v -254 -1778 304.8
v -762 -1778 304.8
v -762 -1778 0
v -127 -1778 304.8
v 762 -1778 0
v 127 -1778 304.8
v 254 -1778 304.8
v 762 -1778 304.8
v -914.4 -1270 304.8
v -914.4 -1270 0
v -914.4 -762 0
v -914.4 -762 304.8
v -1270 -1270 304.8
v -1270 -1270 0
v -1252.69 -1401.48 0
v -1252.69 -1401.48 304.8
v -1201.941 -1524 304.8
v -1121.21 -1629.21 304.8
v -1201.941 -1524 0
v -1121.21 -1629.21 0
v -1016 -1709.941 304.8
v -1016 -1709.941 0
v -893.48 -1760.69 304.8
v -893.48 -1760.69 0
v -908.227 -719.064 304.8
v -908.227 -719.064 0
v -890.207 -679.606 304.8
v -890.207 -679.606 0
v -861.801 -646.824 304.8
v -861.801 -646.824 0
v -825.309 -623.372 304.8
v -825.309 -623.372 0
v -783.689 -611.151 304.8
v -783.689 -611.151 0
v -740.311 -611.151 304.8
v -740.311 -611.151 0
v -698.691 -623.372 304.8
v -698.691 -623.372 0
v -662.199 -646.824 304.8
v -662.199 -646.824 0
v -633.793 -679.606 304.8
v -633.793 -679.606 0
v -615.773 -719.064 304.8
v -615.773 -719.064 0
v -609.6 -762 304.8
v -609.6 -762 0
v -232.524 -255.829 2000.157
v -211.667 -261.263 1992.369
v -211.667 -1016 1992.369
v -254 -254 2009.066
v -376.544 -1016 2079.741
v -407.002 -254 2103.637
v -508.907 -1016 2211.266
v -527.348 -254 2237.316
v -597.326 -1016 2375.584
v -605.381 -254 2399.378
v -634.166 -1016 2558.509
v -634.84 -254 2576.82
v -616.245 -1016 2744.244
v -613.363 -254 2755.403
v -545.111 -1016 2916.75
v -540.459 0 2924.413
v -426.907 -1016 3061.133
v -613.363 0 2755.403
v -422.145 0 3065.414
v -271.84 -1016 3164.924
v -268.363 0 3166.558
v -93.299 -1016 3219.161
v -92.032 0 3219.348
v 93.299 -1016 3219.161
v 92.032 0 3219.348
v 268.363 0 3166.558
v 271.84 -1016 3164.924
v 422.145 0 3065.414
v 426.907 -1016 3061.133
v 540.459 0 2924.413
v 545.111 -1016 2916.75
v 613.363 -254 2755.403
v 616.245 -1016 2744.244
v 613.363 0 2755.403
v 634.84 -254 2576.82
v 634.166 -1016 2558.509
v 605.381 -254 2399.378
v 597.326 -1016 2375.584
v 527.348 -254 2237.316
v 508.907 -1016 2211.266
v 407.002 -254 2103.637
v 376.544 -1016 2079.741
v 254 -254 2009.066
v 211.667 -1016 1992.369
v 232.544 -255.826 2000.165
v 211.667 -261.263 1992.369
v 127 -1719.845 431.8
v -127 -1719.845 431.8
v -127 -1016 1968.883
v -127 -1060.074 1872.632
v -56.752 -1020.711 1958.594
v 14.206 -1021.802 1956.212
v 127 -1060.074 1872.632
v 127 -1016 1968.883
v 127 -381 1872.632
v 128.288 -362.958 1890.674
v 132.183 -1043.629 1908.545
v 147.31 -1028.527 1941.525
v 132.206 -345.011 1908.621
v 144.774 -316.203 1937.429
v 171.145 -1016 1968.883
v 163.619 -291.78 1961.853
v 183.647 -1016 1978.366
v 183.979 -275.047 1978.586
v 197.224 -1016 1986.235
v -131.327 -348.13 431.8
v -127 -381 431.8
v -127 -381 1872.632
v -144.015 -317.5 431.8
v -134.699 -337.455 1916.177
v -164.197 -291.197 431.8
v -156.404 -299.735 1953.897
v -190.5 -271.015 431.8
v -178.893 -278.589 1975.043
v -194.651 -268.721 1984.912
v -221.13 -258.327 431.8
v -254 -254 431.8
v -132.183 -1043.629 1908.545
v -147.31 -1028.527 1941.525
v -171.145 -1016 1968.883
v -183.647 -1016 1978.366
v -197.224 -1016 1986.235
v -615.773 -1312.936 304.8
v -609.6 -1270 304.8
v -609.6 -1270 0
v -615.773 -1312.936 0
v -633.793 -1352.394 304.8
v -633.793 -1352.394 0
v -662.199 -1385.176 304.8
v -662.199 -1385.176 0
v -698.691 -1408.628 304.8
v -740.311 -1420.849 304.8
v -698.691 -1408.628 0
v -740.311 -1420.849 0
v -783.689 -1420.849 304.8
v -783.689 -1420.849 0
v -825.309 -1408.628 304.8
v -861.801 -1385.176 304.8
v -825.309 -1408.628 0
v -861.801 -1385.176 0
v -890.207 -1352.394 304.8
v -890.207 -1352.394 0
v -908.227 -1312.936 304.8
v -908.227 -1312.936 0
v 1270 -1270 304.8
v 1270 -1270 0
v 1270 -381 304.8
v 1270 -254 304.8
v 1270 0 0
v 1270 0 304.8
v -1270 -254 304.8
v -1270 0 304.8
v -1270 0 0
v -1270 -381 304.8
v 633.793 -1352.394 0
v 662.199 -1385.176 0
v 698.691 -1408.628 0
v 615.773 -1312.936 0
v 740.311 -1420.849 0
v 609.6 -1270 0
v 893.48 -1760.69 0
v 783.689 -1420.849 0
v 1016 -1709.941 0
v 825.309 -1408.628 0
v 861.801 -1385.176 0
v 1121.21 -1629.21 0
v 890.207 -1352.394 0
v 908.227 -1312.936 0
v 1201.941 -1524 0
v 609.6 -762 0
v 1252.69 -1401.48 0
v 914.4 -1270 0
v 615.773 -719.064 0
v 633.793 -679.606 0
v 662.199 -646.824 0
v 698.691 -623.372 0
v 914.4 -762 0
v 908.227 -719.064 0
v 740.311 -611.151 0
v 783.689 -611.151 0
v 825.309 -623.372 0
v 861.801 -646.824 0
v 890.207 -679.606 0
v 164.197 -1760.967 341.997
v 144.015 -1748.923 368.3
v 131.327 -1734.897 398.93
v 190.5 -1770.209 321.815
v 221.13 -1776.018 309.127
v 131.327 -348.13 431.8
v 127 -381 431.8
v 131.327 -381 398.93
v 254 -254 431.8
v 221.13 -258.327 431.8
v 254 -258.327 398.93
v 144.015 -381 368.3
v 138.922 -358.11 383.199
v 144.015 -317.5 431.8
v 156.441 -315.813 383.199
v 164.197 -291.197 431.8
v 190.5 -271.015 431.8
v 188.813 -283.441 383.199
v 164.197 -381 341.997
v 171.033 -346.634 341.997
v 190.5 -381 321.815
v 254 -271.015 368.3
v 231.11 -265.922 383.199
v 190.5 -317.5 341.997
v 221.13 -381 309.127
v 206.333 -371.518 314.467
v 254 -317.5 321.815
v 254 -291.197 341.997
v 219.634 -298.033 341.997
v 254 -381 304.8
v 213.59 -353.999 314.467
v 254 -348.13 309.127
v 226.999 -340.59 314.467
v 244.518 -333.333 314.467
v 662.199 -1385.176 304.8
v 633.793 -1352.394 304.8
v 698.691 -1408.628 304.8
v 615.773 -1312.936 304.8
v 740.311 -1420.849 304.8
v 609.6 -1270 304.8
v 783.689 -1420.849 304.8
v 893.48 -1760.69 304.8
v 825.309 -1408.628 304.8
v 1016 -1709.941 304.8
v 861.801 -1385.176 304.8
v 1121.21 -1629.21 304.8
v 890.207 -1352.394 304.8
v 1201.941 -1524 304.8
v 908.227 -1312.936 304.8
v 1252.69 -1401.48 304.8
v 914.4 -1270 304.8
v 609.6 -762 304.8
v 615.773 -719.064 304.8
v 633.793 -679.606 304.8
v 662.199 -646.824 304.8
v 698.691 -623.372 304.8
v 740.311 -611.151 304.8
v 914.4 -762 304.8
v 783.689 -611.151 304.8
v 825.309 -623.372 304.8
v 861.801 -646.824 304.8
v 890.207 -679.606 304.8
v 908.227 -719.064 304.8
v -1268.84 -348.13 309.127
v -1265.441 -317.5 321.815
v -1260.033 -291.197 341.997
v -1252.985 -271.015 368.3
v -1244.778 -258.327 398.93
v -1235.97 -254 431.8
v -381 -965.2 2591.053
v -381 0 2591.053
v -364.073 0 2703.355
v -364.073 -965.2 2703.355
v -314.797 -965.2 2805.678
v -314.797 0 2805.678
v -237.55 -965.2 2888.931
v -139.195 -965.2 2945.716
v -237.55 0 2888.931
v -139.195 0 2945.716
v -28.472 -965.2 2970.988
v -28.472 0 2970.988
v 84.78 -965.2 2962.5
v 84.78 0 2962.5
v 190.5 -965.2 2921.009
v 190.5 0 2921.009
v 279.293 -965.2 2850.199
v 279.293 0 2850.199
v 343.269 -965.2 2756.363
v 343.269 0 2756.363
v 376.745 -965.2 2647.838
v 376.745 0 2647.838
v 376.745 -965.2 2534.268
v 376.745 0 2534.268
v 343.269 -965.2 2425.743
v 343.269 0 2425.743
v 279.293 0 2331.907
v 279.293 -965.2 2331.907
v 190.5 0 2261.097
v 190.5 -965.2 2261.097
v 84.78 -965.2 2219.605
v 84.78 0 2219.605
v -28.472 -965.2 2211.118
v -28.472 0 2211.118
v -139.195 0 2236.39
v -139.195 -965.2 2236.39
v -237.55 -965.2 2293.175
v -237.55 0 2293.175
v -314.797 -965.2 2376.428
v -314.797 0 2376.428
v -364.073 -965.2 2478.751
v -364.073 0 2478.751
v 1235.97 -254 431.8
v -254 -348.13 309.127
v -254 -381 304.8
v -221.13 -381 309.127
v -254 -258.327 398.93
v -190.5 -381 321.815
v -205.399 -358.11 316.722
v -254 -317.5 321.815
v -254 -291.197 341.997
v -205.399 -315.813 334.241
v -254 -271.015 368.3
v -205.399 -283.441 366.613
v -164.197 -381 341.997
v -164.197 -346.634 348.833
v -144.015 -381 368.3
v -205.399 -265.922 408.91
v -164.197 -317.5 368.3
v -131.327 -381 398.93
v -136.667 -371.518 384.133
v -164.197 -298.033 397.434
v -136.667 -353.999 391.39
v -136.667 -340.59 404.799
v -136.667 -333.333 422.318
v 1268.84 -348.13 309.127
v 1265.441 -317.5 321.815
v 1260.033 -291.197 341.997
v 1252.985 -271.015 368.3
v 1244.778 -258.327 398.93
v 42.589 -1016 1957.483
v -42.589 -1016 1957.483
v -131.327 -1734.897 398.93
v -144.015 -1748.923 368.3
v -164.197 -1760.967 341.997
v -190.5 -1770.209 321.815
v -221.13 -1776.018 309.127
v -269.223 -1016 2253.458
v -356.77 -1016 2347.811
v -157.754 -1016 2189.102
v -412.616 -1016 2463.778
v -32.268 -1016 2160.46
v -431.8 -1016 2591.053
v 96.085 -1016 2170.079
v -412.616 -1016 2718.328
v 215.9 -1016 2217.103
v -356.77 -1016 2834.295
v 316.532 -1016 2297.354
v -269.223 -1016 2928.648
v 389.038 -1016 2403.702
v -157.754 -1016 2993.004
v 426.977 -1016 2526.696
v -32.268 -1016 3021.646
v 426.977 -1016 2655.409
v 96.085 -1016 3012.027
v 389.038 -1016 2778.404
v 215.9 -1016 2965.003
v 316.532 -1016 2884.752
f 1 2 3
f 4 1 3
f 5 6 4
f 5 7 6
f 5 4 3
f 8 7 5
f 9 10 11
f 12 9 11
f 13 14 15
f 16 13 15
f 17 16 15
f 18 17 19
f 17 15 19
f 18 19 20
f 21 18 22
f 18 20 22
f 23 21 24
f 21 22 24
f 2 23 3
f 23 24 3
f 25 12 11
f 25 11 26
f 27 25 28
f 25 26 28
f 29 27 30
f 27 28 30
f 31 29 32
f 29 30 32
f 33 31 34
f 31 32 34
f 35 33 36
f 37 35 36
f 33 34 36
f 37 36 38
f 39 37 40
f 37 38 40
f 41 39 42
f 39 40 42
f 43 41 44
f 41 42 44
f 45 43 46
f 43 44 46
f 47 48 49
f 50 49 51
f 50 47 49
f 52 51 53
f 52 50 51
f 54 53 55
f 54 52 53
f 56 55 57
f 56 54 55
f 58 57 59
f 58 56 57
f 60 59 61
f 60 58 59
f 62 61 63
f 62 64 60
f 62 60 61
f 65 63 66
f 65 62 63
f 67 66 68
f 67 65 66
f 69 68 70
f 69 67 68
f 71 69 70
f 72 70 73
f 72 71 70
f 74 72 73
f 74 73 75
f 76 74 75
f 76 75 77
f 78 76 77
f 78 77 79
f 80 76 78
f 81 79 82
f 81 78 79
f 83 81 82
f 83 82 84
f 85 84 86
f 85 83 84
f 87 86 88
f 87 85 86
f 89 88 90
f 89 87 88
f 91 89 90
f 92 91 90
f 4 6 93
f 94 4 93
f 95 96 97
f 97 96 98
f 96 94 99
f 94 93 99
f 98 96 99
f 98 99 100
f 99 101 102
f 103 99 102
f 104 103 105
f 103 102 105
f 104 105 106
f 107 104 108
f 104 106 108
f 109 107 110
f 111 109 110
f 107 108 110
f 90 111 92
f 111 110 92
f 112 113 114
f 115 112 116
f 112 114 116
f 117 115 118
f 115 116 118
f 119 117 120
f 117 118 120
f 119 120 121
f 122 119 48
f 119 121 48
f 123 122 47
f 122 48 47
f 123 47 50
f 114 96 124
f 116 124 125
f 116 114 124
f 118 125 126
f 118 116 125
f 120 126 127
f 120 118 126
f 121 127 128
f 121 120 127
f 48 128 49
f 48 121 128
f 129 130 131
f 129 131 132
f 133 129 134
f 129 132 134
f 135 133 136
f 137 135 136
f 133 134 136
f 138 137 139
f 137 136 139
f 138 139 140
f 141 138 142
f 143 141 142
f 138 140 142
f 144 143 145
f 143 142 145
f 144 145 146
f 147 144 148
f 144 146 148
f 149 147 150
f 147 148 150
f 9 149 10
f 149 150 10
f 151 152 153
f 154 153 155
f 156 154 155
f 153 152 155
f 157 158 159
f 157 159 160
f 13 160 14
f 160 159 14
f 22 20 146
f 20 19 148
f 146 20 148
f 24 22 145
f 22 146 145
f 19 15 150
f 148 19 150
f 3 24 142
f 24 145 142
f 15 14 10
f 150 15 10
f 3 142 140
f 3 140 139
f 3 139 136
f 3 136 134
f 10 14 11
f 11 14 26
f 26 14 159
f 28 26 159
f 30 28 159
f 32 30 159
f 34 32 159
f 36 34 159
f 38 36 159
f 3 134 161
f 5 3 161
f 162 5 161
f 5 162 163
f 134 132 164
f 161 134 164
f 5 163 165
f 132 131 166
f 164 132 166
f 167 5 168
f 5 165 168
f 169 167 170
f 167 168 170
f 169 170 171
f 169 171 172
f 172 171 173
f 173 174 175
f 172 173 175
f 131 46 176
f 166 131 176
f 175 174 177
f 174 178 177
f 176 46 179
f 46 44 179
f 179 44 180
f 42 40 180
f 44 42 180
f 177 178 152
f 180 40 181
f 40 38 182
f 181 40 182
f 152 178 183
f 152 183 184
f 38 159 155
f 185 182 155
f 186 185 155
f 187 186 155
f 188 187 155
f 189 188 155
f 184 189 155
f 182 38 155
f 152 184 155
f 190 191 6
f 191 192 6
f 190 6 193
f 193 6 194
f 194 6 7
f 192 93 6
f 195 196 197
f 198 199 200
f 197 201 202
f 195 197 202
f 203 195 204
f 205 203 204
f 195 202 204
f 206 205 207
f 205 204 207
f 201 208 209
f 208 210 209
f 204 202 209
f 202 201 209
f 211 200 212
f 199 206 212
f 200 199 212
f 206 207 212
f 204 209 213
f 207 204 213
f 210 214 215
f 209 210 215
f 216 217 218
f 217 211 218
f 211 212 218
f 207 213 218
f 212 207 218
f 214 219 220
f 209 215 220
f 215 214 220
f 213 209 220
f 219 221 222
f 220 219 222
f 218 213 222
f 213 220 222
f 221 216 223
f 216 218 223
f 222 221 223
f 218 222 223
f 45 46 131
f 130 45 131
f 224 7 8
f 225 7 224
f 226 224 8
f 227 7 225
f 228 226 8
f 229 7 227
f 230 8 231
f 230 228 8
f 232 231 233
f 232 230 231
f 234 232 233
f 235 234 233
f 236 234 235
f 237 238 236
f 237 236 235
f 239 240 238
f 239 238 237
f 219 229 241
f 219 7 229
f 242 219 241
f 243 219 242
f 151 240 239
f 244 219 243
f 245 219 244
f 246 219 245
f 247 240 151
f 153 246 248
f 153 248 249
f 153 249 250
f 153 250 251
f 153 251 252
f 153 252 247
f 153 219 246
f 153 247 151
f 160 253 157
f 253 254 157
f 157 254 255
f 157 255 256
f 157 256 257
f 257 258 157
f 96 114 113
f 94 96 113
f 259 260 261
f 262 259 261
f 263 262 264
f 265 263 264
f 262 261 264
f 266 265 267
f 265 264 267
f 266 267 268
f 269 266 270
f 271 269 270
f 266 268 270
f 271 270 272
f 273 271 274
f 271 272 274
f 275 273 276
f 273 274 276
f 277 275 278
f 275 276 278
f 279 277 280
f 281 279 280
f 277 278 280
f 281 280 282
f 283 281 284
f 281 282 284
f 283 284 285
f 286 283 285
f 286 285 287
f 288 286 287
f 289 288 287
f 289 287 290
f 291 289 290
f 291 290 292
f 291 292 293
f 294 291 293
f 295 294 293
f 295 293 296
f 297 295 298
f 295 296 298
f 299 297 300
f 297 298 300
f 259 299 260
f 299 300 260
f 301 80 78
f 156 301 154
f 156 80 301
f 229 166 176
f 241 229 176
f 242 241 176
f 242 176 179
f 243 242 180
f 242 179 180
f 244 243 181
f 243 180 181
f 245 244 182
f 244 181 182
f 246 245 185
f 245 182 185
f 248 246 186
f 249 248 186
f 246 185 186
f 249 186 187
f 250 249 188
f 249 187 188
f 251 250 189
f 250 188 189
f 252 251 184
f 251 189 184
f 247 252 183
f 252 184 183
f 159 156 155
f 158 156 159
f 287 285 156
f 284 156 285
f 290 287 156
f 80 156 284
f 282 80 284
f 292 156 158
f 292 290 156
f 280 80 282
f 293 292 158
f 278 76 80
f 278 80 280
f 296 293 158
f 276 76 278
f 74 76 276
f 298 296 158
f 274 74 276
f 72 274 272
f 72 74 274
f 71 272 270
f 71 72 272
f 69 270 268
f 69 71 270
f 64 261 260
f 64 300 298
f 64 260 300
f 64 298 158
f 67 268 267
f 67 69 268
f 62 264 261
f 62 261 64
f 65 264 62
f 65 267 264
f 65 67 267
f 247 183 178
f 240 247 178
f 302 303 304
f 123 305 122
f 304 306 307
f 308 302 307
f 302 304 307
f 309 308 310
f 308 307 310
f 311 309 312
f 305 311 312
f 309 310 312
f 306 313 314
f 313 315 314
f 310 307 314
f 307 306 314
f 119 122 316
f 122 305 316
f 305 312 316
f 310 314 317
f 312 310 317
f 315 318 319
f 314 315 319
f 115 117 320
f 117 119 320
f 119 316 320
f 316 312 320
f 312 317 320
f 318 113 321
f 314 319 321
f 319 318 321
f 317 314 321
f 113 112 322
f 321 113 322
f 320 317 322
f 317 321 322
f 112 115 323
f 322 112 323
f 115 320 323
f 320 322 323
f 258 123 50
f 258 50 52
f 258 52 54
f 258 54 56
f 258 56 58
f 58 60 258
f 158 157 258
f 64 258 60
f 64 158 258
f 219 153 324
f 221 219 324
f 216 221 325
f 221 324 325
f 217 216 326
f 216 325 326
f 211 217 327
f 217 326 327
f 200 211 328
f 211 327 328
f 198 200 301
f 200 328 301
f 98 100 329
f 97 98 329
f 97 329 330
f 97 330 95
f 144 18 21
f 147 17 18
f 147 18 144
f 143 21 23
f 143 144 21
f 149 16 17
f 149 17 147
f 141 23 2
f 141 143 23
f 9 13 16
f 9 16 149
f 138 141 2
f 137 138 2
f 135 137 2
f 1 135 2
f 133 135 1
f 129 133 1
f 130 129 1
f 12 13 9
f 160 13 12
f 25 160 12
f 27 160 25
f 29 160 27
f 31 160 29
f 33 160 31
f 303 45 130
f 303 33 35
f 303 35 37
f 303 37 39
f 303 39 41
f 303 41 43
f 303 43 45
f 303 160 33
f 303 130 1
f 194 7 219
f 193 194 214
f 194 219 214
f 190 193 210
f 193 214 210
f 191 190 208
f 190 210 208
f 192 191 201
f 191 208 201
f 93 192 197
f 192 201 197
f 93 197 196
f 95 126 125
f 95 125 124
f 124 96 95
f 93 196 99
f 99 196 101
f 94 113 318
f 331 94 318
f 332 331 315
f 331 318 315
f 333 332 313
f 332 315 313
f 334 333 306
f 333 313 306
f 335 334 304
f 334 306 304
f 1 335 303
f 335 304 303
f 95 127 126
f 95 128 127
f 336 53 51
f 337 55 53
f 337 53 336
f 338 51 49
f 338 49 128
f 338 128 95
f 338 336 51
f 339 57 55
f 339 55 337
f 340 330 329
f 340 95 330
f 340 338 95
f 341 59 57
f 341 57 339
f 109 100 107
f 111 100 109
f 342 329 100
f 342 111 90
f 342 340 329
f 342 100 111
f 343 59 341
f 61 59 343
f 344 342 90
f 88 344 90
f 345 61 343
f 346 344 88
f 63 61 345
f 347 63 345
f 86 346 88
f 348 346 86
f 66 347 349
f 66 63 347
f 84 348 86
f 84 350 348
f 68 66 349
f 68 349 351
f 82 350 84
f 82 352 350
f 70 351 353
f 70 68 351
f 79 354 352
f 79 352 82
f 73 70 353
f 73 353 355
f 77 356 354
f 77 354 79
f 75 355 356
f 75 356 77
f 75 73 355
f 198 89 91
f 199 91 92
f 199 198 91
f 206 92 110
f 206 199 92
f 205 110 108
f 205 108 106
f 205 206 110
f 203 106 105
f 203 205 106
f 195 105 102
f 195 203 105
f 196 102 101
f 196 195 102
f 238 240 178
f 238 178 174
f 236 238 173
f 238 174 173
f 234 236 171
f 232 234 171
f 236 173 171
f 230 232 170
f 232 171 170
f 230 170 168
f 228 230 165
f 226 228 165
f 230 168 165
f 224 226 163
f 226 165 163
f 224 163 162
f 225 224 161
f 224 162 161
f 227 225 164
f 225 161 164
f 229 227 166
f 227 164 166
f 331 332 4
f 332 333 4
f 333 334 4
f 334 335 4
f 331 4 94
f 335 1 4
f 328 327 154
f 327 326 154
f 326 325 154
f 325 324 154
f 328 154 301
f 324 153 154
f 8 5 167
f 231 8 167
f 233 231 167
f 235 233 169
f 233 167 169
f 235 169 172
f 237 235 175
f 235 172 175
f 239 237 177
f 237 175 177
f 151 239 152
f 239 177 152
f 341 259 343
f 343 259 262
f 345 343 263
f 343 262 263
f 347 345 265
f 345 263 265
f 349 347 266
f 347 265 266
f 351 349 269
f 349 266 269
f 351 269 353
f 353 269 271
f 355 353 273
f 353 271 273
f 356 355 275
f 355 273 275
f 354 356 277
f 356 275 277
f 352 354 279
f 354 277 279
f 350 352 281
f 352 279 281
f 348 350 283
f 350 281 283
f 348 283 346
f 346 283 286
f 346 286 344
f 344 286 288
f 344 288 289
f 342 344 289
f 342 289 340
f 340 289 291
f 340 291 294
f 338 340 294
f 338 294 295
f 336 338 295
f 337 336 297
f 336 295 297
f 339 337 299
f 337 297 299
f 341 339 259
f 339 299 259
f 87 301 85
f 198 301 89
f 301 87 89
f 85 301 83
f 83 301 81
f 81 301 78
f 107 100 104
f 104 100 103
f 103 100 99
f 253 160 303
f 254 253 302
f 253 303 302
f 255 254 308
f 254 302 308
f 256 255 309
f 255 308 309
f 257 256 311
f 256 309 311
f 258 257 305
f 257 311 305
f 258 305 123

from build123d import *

# Parameters (mm, degrees)
F1_DEPTH      = 304.8
F3_DEPTH      = 254
F2_R          = 381
F4_DEPTH      = 1016
F5_SIZE       = 50.8
F7_DEPTH      = 1524
F9_DEPTH      = 279.4
F10_T1_DEPTH  = 1002.6252375466
F10_S5_W      = 129.54
F10_S5_H      = 129.54
F10_T6_DEPTH  = 129.54
F10_S11_W     = 129.54
F10_S11_H     = 129.54
F10_T12_DEPTH = 129.54
F10_T18_DEPTH = 1333.5
F10_T23_DEPTH = 1714.5
F10_T28_DEPTH = 1854.5825321713
F10_S29_R     = 635
F10_T30_DEPTH = 933
F10_T34_DEPTH = 1854.5825321713
F10_S35_R     = 635
F10_T36_DEPTH = 933
F10_T40_DEPTH = 1333.5
F10_T45_DEPTH = 1714.5
F10_T50_DEPTH = 1243.2504750931
F10_T55_DEPTH = 1243.2504750931


# Not quite as in the source:
# - a fillet or chamfer that OpenCascade refuses, or shapes differently, is made with other operations: its cross-section is extruded or revolved along the edge and cut away or added


with BuildPart() as f1:
    # F0 (on Top) → F1 (new body)
    with BuildSketch(Plane.XY):
        with BuildLine():
            Line((0, 0), (-1270, 0))
            Line((-1270, 0), (-1270, -1270))
            ThreePointArc((-1270, -1270), (-1121.2102448428, -1629.2102448428), (-762, -1778))
            Line((-762, -1778), (762, -1778))
            ThreePointArc((762, -1778), (1121.2102448428, -1629.2102448428), (1270, -1270))
            Line((1270, -1270), (1270, 0))
            Line((1270, 0), (0, 0))
        make_face()
        with BuildLine():
            ThreePointArc((-609.6, -1270.0000219048), (-762, -1422.4), (-914.4, -1270.0000219048))
            Line((-914.4, -1270.0000219048), (-914.4, -762.0000219048))
            ThreePointArc((-914.4, -762.0000219048), (-762, -609.6000219048), (-609.6, -762.0000219048))
            Line((-609.6, -762.0000219048), (-609.6, -1270.0000219048))
        make_face(mode=Mode.SUBTRACT)
        with BuildLine():
            ThreePointArc((609.6, -762.0000219048), (762, -609.6000219048), (914.4, -762.0000219048))
            Line((914.4, -762.0000219048), (914.4, -1270.0000219048))
            ThreePointArc((914.4, -1270.0000219048), (762, -1422.4), (609.6, -1270.0000219048))
            Line((609.6, -1270.0000219048), (609.6, -762.0000219048))
        make_face(mode=Mode.SUBTRACT)
    extrude(amount=F1_DEPTH)

    # F2 (on face) → F3 (join)
    with BuildSketch(Plane(origin=(0, 0, 0), x_dir=(-1, 0, 0), z_dir=(0, 1, 0))):
        with BuildLine():
            Line((-613.3628996936, 2755.4030204783), (-1270, 304.8))
            Line((-1270, 304.8), (1270, 304.8))
            Line((1270, 304.8), (613.3628996936, 2755.4030204783))
            ThreePointArc((613.3628996936, 2755.4030204783), (629.5674869724, 2673.937058898), (635, 2591.0529268382))
            ThreePointArc((635, 2591.0529268382), (-82.8841320597, 1961.4854398659), (-613.3628996936, 2755.4030204783))
        make_face()
    extrude(amount=-F3_DEPTH)

    # F2 (on face) → F4 (join)
    with BuildSketch(Plane(origin=(0, 0, 0), x_dir=(-1, 0, 0), z_dir=(0, 1, 0))):
        with BuildLine():
            ThreePointArc((613.3628996936, 2755.4030204783), (0, 3226.0529268382), (-613.3628996936, 2755.4030204783))
            ThreePointArc((-613.3628996936, 2755.4030204783), (-82.8841320597, 1961.4854398659), (635, 2591.0529268382))
            ThreePointArc((635, 2591.0529268382), (629.5674869724, 2673.937058898), (613.3628996936, 2755.4030204783))
        make_face()
        with Locations((0, 2591.0529268382)):
            Circle(F2_R, mode=Mode.SUBTRACT)
    extrude(amount=-F4_DEPTH)

    # F5
    f5_edges = [f1.edges().sort_by_distance(p)[0] for p in [
        (381, -1016, 2591.052927),
    ]]
    chamfer(f5_edges, length=F5_SIZE)

    # F6 (on face) → F7 (join)
    with BuildSketch(Plane.XZ.offset(254)):
        with BuildLine():
            Line((-127, 1968.8825321713), (-127, 304.8))
            Line((-127, 304.8), (127, 304.8))
            Line((127, 304.8), (127, 1968.8825321713))
            ThreePointArc((127, 1968.8825321713), (0, 1956.0529268382), (-127, 1968.8825321713))
        make_face()
    extrude(amount=F7_DEPTH)

    # F8 (on face) → F9 (cut)
    with BuildSketch(Plane.YZ.offset(127)):
        Polygon((-1778, 1968.8825321713), (-1778, 304.8), (-1016, 1968.8825321713), align=None)
    extrude(amount=-F9_DEPTH, mode=Mode.SUBTRACT)

    # F10: fillet of radius 127 on 8 edges, made by hand

    # F10_s2 → F10_t1 (join)
    with BuildSketch(Plane.XZ.offset(13.3747624534)):
        with BuildLine():
            ThreePointArc((127, 1872.6324371527), (150.3049342222, 1945.9559213398), (211.6666666667, 1992.3691854336))
            ThreePointArc((211.6666666667, 1992.3691854336), (169.7400468309, 1979.1597037169), (127, 1968.8825321713))
            Line((127, 1968.8825321713), (127, 1872.6324371527))
        make_face()
        with BuildLine():
            ThreePointArc((-127, 1872.6324371527), (-150.3049342222, 1945.9559213398), (-211.6666666667, 1992.3691854336))
            ThreePointArc((-211.6666666667, 1992.3691854336), (-169.7400468309, 1979.1597037169), (-127, 1968.8825321713))
            Line((-127, 1968.8825321713), (-127, 1872.6324371527))
        make_face()
    extrude(amount=F10_T1_DEPTH)


with BuildPart() as f10_tool4:
    # F10_s5 → F10_t6 (new body)
    with BuildSketch(Plane.YZ.offset(-254)):
        with Locations((-316.23, 367.03)):
            Rectangle(F10_S5_W, F10_S5_H)
    extrude(amount=F10_T6_DEPTH)

    # F10_s7 → F10_t8 (revolve, cut)
    with BuildSketch(Plane(origin=(-254, -381, 431.8), x_dir=(0, -0.7071067812, 0.7071067812), z_dir=(0, 0.7071067812, 0.7071067812))):
        with BuildLine():
            ThreePointArc((0, -127), (127, 0), (0, 127))
            Line((0, 127), (0, -127))
        make_face()
    revolve(axis=Axis((-254, -381, 431.8), (1, 0, 0)), mode=Mode.SUBTRACT)


with BuildPart() as f1_1:
    add(f1.part)

    # F10_t3: union F10_tool4
    add(f10_tool4.part)


with BuildPart() as f10_tool10:
    # F10_s11 → F10_t12 (new body)
    with BuildSketch(Plane.XY.offset(431.8)):
        with Locations((189.23, -316.23)):
            Rectangle(F10_S11_W, F10_S11_H)
    extrude(amount=-F10_T12_DEPTH)

    # F10_s13 → F10_t14 (revolve, cut)
    with BuildSketch(Plane(origin=(254, -381, 431.8), x_dir=(0.7071067812, -0.7071067812, 0), z_dir=(0.7071067812, 0.7071067812, 0))):
        with BuildLine():
            ThreePointArc((0, -127), (127, 0), (0, 127))
            Line((0, 127), (0, -127))
        make_face()
    revolve(axis=Axis((254, -381, 431.8), (0, 0, -1)), mode=Mode.SUBTRACT)


with BuildPart() as f1_2:
    add(f1_1.part)

    # F10_t9: union F10_tool10
    add(f10_tool10.part)


with BuildPart() as f10_tool16:
    # F10_s17 → F10_t18 (new body)
    with BuildSketch(Plane.YZ.offset(-254)):
        with BuildLine():
            ThreePointArc((-381, 304.8), (-291.1974387893, 341.9974387893), (-254, 431.8))
            Line((-254, 431.8), (-254, 304.8))
            Line((-254, 304.8), (-381, 304.8))
        make_face()
    extrude(amount=-F10_T18_DEPTH)

    split(bisect_by=Plane(origin=(-1261.1261314031, 0, 337.9177284633), x_dir=(0, 1, 0), z_dir=(0.9659258263, 0, -0.2588190451)), keep=Keep.TOP)


with BuildPart() as f1_3:
    add(f1_2.part)

    # F10_t15: union F10_tool16
    add(f10_tool16.part)


with BuildPart() as f10_tool21:
    # F10_s22 → F10_t23 (new body)
    with BuildSketch(Plane.XZ.offset(381)):
        with BuildLine():
            ThreePointArc((-127, 431.8), (-164.1974387893, 341.9974387893), (-254, 304.8))
            Line((-254, 304.8), (-127, 304.8))
            Line((-127, 304.8), (-127, 431.8))
        make_face()
    extrude(amount=F10_T23_DEPTH)

    split(bisect_by=Plane(origin=(0, -1585.1865820182, 725.8727569971), x_dir=(1, 0, 0), z_dir=(0, 0.9092105607, -0.4163365902)), keep=Keep.TOP)


with BuildPart() as f1_4:
    add(f1_3.part)

    # F10_t20: union F10_tool21
    add(f10_tool21.part)


with BuildPart() as f10_tool26:
    # F10_s27 → F10_t28 (new body)
    with BuildSketch(Plane.XY.offset(2286.3825321713)):
        with BuildLine():
            ThreePointArc((-127, -381), (-164.1974387893, -291.1974387893), (-254, -254))
            Line((-254, -254), (-127, -254))
            Line((-127, -254), (-127, -381))
        make_face()
    extrude(amount=-F10_T28_DEPTH)

    # F10_s29 → F10_t30 (cut, symmetric)
    with BuildSketch(Plane.XZ.offset(317.5)):
        with Locations((0, 2591.0529268382)):
            Circle(F10_S29_R)
    extrude(amount=F10_T30_DEPTH, both=True, mode=Mode.SUBTRACT)


with BuildPart() as f1_5:
    add(f1_4.part)

    # F10_t25: union F10_tool26
    add(f10_tool26.part)


with BuildPart() as f10_tool32:
    # F10_s33 → F10_t34 (new body)
    with BuildSketch(Plane.XY.offset(431.8)):
        with BuildLine():
            ThreePointArc((254, -254), (164.1974387893, -291.1974387893), (127, -381))
            Line((127, -381), (127, -254))
            Line((127, -254), (254, -254))
        make_face()
    extrude(amount=F10_T34_DEPTH)

    # F10_s35 → F10_t36 (cut, symmetric)
    with BuildSketch(Plane.XZ.offset(317.5)):
        with Locations((0, 2591.0529268382)):
            Circle(F10_S35_R)
    extrude(amount=F10_T36_DEPTH, both=True, mode=Mode.SUBTRACT)


with BuildPart() as f1_6:
    add(f1_5.part)

    # F10_t31: union F10_tool32
    add(f10_tool32.part)


with BuildPart() as f10_tool38:
    # F10_s39 → F10_t40 (new body)
    with BuildSketch(Plane.YZ.offset(1587.5)):
        with BuildLine():
            ThreePointArc((-381, 304.8), (-291.1974387893, 341.9974387893), (-254, 431.8))
            Line((-254, 431.8), (-254, 304.8))
            Line((-254, 304.8), (-381, 304.8))
        make_face()
    extrude(amount=-F10_T40_DEPTH)

    split(bisect_by=Plane(origin=(1261.1261314031, 0, 337.9177284633), x_dir=(0, 1, 0), z_dir=(-0.9659258263, 0, -0.2588190451)), keep=Keep.TOP)


with BuildPart() as f1_7:
    add(f1_6.part)

    # F10_t37: union F10_tool38
    add(f10_tool38.part)


with BuildPart() as f10_tool43:
    # F10_s44 → F10_t45 (new body)
    with BuildSketch(Plane.XZ.offset(381)):
        with BuildLine():
            ThreePointArc((254, 304.8), (164.1974387893, 341.9974387893), (127, 431.8))
            Line((127, 431.8), (127, 304.8))
            Line((127, 304.8), (254, 304.8))
        make_face()
    extrude(amount=F10_T45_DEPTH)

    split(bisect_by=Plane(origin=(0, -1585.1865820182, 725.8727569971), x_dir=(1, 0, 0), z_dir=(0, 0.9092105607, -0.4163365902)), keep=Keep.TOP)


with BuildPart() as f1_8:
    add(f1_7.part)

    # F10_t42: union F10_tool43
    add(f10_tool43.part)


with BuildPart() as f10_tool48:
    # F10_s49 → F10_t50 (new body)
    with BuildSketch(Plane.XZ.offset(13.3747624534)):
        with BuildLine():
            ThreePointArc((127, 1872.6324371527), (150.3049342222, 1945.9559213398), (211.6666666667, 1992.3691854336))
            ThreePointArc((211.6666666667, 1992.3691854336), (169.7400468309, 1979.1597037169), (127, 1968.8825321713))
            Line((127, 1968.8825321713), (127, 1872.6324371527))
        make_face()
    extrude(amount=F10_T50_DEPTH)

    split(bisect_by=Plane(origin=(0, -1585.1865820182, 725.8727569971), x_dir=(1, 0, 0), z_dir=(0, 0.9092105607, -0.4163365902)), keep=Keep.TOP)


with BuildPart() as f1_9:
    add(f1_8.part)

    # F10_t47: union F10_tool48
    add(f10_tool48.part)


with BuildPart() as f10_tool53:
    # F10_s54 → F10_t55 (new body)
    with BuildSketch(Plane.XZ.offset(13.3747624535)):
        with BuildLine():
            ThreePointArc((-127, 1872.6324371527), (-150.3049342222, 1945.9559213398), (-211.6666666667, 1992.3691854336))
            ThreePointArc((-211.6666666667, 1992.3691854336), (-169.7400468309, 1979.1597037169), (-127, 1968.8825321713))
            Line((-127, 1968.8825321713), (-127, 1872.6324371527))
        make_face()
    extrude(amount=F10_T55_DEPTH)

    split(bisect_by=Plane(origin=(0, -1585.1865820182, 725.8727569971), x_dir=(1, 0, 0), z_dir=(0, 0.9092105607, -0.4163365902)), keep=Keep.TOP)


with BuildPart() as f1_10:
    add(f1_9.part)

    # F10_t52: union F10_tool53
    add(f10_tool53.part)


solid = f1_10.part
